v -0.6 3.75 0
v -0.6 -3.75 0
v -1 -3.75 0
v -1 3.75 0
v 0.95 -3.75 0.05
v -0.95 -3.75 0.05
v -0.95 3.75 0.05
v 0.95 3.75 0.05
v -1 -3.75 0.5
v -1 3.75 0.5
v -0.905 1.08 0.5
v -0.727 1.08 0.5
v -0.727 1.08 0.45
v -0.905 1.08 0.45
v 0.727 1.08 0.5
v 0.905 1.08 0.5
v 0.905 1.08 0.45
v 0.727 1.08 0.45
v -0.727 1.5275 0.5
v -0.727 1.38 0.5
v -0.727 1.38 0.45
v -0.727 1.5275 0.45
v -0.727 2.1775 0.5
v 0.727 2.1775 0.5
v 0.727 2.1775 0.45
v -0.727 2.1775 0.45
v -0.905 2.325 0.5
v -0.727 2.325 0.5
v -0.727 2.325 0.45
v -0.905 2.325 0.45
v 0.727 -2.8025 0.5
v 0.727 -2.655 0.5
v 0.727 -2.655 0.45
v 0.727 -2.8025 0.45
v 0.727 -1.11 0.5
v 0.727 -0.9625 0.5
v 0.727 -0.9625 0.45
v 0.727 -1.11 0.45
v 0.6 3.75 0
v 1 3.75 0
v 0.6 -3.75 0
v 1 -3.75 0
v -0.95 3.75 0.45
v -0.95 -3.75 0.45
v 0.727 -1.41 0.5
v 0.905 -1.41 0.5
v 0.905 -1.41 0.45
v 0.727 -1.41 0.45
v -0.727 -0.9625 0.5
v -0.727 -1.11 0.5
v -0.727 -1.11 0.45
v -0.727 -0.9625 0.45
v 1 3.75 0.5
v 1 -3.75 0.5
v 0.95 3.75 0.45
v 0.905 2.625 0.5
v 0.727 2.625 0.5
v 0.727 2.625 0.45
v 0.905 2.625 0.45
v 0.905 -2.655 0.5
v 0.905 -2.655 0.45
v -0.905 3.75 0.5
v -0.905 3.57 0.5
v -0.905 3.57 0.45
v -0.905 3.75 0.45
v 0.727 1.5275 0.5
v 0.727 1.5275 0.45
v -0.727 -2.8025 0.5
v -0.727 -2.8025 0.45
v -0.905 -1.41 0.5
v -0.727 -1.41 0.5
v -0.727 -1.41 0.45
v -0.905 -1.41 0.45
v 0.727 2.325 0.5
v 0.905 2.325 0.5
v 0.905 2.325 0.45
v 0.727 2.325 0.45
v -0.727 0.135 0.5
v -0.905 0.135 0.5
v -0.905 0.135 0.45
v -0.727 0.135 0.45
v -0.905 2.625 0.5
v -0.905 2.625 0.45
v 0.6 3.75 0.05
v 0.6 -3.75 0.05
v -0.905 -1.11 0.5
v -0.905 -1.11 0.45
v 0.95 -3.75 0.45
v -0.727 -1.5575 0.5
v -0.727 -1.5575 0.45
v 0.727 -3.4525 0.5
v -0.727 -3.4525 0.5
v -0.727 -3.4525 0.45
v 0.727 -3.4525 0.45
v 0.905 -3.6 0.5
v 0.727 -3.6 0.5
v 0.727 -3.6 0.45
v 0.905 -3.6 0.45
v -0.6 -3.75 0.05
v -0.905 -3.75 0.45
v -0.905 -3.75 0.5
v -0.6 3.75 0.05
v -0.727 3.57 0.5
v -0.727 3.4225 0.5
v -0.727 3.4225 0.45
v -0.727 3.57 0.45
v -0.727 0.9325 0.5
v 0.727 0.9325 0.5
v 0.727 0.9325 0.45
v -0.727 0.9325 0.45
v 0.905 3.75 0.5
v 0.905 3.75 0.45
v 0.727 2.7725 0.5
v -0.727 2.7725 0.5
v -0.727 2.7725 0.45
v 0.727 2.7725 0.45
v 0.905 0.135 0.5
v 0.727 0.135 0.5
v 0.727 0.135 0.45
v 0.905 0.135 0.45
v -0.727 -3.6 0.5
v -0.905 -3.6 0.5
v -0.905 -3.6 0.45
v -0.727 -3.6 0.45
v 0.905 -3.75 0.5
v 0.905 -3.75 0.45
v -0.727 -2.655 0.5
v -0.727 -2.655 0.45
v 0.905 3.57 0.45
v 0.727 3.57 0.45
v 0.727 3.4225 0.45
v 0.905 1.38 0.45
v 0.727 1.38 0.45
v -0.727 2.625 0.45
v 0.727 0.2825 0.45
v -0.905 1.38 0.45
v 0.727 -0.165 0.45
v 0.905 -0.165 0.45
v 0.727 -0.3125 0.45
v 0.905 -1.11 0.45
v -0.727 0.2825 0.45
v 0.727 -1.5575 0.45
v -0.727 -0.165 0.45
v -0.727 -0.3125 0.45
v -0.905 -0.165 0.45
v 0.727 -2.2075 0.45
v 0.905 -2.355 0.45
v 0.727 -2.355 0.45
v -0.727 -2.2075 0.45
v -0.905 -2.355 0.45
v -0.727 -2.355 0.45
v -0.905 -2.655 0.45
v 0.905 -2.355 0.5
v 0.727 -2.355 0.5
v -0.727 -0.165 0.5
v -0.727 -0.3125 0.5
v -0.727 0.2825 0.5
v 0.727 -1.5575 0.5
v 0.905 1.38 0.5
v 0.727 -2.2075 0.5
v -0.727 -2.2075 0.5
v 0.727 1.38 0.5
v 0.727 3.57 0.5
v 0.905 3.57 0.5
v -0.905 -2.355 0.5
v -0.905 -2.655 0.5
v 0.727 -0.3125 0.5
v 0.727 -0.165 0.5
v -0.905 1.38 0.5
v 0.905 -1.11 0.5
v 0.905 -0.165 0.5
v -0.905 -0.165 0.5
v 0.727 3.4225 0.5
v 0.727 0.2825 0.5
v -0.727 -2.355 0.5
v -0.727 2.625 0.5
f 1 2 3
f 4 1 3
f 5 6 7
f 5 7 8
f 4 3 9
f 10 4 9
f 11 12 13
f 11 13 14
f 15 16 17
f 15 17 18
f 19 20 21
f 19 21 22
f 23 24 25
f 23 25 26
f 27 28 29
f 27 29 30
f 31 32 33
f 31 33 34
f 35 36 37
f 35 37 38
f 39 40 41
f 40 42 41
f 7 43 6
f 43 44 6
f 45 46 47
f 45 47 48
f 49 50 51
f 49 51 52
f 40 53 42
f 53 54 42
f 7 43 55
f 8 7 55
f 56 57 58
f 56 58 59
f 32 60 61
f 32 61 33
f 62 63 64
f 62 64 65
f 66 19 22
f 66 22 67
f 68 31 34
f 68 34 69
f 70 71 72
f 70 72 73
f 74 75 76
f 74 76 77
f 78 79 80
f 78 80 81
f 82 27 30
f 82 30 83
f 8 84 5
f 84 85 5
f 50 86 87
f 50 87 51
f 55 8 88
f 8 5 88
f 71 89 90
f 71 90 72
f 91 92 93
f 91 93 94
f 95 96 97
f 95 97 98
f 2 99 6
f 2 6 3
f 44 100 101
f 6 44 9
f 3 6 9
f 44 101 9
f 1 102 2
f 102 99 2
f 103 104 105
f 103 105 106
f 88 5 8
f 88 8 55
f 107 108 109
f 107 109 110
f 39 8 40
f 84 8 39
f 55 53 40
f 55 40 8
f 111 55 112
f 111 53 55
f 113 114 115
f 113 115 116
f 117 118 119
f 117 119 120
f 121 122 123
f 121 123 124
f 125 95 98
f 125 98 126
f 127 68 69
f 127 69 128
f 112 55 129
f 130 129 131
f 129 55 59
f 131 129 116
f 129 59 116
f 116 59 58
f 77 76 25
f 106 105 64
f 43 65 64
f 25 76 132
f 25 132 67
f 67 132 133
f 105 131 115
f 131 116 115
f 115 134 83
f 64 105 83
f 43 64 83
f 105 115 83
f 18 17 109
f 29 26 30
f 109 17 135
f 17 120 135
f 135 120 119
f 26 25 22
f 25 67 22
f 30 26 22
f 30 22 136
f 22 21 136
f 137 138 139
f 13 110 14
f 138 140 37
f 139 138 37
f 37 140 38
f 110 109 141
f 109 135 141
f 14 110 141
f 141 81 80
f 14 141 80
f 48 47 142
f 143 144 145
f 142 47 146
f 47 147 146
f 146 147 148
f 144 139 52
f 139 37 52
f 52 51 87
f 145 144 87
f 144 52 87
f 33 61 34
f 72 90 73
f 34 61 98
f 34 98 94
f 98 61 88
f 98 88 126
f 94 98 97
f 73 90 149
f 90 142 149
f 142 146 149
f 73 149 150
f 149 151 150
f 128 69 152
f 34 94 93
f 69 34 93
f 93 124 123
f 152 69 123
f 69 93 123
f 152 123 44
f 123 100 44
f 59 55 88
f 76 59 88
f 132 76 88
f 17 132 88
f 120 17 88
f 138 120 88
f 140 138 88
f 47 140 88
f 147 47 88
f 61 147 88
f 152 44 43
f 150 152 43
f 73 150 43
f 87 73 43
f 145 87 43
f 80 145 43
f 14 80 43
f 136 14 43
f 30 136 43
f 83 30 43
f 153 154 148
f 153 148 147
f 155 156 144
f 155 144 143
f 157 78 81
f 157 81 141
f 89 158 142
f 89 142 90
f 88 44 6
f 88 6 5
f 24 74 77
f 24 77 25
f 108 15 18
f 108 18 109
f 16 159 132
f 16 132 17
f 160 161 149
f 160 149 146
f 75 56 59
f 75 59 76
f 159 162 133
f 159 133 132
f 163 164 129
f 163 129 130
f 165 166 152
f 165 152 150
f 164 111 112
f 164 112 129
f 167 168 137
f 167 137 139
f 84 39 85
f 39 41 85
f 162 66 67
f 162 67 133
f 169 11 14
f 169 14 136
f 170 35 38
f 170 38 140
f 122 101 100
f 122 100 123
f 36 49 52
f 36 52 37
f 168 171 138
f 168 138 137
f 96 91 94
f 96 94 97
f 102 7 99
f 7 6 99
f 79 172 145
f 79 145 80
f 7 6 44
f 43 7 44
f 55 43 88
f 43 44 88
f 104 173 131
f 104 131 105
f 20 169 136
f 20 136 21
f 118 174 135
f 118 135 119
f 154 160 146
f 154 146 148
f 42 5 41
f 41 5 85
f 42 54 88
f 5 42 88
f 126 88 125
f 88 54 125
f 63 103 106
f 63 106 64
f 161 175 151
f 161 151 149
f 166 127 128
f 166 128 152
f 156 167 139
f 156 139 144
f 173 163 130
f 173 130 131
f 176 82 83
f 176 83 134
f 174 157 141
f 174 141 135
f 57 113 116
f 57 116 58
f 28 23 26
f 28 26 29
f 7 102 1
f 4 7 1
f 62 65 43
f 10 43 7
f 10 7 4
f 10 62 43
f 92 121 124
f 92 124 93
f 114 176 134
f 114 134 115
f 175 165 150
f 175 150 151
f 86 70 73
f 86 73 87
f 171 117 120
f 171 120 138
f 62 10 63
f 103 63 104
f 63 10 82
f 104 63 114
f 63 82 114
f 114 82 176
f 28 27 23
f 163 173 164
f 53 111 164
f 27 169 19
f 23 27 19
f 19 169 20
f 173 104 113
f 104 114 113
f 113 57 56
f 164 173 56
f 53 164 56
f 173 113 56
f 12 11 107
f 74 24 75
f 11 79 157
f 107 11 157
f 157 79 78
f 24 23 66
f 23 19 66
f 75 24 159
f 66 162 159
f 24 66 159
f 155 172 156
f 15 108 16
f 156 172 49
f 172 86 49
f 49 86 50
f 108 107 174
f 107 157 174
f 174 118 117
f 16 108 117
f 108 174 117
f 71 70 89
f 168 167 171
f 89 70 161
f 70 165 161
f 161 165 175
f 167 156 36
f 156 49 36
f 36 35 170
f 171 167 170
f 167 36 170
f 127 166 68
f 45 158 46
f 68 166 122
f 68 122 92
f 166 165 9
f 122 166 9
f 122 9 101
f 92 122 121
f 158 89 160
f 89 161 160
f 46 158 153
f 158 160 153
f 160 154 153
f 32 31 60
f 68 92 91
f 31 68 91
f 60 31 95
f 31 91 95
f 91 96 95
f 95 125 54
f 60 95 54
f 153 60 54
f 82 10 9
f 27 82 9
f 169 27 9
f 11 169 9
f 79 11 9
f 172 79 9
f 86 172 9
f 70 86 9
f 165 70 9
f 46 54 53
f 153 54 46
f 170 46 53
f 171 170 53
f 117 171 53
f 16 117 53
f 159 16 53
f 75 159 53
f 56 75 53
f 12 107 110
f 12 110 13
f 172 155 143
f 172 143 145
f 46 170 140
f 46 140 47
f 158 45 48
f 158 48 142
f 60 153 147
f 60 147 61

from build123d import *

# Parameters (mm, degrees)
PAD_DEPTH           = 3.75
POCKET_DEPTH        = 0.055
LINEARPATTERN_COUNT = 7
LINEARPATTERN_PITCH = 1.245
SKETCH002_W         = 1.9
SKETCH002_H         = 0.4
PAD001_DEPTH        = 3.75


with BuildPart() as metalfilm:
    # Sketch → Pad (new body, symmetric)
    with BuildSketch(Plane.XZ):
        Polygon((-1, 0.5), (1, 0.5), (1, 0), (0.6, 0), (0.6, 0.05), (0.95, 0.05), (0.95, 0.45), (-0.95, 0.45), (-0.95, 0.05), (-0.6, 0.05), (-0.6, 0), (-1, 0), align=None)
    extrude(amount=PAD_DEPTH, both=True)

    # Sketch001 → Pocket (cut)
    with BuildSketch(Plane.XY.offset(0.5)):
        Polygon((-0.905, -3.6), (-0.727, -3.6), (-0.727, -3.4525), (0.727, -3.4525), (0.727, -3.6), (0.905, -3.6), (0.905, -3.9), (0.727, -3.9), (0.727, -4.0475), (-0.727, -4.0475), (-0.727, -3.9), (-0.905, -3.9), align=None)
    pocket = extrude(amount=-POCKET_DEPTH, mode=Mode.SUBTRACT)

    # LinearPattern: Pocket ×7
    with Locations(*[(0, i * LINEARPATTERN_PITCH, 0) for i in range(1, LINEARPATTERN_COUNT)]):
        add(pocket, mode=Mode.SUBTRACT)


with BuildPart() as ceramicbody:
    # Sketch002 → Pad001 (new body, symmetric)
    with BuildSketch(Plane.XZ):
        with Locations((0, 0.25)):
            Rectangle(SKETCH002_W, SKETCH002_H)
    extrude(amount=PAD001_DEPTH, both=True)


solid = Compound([metalfilm.part, ceramicbody.part])
